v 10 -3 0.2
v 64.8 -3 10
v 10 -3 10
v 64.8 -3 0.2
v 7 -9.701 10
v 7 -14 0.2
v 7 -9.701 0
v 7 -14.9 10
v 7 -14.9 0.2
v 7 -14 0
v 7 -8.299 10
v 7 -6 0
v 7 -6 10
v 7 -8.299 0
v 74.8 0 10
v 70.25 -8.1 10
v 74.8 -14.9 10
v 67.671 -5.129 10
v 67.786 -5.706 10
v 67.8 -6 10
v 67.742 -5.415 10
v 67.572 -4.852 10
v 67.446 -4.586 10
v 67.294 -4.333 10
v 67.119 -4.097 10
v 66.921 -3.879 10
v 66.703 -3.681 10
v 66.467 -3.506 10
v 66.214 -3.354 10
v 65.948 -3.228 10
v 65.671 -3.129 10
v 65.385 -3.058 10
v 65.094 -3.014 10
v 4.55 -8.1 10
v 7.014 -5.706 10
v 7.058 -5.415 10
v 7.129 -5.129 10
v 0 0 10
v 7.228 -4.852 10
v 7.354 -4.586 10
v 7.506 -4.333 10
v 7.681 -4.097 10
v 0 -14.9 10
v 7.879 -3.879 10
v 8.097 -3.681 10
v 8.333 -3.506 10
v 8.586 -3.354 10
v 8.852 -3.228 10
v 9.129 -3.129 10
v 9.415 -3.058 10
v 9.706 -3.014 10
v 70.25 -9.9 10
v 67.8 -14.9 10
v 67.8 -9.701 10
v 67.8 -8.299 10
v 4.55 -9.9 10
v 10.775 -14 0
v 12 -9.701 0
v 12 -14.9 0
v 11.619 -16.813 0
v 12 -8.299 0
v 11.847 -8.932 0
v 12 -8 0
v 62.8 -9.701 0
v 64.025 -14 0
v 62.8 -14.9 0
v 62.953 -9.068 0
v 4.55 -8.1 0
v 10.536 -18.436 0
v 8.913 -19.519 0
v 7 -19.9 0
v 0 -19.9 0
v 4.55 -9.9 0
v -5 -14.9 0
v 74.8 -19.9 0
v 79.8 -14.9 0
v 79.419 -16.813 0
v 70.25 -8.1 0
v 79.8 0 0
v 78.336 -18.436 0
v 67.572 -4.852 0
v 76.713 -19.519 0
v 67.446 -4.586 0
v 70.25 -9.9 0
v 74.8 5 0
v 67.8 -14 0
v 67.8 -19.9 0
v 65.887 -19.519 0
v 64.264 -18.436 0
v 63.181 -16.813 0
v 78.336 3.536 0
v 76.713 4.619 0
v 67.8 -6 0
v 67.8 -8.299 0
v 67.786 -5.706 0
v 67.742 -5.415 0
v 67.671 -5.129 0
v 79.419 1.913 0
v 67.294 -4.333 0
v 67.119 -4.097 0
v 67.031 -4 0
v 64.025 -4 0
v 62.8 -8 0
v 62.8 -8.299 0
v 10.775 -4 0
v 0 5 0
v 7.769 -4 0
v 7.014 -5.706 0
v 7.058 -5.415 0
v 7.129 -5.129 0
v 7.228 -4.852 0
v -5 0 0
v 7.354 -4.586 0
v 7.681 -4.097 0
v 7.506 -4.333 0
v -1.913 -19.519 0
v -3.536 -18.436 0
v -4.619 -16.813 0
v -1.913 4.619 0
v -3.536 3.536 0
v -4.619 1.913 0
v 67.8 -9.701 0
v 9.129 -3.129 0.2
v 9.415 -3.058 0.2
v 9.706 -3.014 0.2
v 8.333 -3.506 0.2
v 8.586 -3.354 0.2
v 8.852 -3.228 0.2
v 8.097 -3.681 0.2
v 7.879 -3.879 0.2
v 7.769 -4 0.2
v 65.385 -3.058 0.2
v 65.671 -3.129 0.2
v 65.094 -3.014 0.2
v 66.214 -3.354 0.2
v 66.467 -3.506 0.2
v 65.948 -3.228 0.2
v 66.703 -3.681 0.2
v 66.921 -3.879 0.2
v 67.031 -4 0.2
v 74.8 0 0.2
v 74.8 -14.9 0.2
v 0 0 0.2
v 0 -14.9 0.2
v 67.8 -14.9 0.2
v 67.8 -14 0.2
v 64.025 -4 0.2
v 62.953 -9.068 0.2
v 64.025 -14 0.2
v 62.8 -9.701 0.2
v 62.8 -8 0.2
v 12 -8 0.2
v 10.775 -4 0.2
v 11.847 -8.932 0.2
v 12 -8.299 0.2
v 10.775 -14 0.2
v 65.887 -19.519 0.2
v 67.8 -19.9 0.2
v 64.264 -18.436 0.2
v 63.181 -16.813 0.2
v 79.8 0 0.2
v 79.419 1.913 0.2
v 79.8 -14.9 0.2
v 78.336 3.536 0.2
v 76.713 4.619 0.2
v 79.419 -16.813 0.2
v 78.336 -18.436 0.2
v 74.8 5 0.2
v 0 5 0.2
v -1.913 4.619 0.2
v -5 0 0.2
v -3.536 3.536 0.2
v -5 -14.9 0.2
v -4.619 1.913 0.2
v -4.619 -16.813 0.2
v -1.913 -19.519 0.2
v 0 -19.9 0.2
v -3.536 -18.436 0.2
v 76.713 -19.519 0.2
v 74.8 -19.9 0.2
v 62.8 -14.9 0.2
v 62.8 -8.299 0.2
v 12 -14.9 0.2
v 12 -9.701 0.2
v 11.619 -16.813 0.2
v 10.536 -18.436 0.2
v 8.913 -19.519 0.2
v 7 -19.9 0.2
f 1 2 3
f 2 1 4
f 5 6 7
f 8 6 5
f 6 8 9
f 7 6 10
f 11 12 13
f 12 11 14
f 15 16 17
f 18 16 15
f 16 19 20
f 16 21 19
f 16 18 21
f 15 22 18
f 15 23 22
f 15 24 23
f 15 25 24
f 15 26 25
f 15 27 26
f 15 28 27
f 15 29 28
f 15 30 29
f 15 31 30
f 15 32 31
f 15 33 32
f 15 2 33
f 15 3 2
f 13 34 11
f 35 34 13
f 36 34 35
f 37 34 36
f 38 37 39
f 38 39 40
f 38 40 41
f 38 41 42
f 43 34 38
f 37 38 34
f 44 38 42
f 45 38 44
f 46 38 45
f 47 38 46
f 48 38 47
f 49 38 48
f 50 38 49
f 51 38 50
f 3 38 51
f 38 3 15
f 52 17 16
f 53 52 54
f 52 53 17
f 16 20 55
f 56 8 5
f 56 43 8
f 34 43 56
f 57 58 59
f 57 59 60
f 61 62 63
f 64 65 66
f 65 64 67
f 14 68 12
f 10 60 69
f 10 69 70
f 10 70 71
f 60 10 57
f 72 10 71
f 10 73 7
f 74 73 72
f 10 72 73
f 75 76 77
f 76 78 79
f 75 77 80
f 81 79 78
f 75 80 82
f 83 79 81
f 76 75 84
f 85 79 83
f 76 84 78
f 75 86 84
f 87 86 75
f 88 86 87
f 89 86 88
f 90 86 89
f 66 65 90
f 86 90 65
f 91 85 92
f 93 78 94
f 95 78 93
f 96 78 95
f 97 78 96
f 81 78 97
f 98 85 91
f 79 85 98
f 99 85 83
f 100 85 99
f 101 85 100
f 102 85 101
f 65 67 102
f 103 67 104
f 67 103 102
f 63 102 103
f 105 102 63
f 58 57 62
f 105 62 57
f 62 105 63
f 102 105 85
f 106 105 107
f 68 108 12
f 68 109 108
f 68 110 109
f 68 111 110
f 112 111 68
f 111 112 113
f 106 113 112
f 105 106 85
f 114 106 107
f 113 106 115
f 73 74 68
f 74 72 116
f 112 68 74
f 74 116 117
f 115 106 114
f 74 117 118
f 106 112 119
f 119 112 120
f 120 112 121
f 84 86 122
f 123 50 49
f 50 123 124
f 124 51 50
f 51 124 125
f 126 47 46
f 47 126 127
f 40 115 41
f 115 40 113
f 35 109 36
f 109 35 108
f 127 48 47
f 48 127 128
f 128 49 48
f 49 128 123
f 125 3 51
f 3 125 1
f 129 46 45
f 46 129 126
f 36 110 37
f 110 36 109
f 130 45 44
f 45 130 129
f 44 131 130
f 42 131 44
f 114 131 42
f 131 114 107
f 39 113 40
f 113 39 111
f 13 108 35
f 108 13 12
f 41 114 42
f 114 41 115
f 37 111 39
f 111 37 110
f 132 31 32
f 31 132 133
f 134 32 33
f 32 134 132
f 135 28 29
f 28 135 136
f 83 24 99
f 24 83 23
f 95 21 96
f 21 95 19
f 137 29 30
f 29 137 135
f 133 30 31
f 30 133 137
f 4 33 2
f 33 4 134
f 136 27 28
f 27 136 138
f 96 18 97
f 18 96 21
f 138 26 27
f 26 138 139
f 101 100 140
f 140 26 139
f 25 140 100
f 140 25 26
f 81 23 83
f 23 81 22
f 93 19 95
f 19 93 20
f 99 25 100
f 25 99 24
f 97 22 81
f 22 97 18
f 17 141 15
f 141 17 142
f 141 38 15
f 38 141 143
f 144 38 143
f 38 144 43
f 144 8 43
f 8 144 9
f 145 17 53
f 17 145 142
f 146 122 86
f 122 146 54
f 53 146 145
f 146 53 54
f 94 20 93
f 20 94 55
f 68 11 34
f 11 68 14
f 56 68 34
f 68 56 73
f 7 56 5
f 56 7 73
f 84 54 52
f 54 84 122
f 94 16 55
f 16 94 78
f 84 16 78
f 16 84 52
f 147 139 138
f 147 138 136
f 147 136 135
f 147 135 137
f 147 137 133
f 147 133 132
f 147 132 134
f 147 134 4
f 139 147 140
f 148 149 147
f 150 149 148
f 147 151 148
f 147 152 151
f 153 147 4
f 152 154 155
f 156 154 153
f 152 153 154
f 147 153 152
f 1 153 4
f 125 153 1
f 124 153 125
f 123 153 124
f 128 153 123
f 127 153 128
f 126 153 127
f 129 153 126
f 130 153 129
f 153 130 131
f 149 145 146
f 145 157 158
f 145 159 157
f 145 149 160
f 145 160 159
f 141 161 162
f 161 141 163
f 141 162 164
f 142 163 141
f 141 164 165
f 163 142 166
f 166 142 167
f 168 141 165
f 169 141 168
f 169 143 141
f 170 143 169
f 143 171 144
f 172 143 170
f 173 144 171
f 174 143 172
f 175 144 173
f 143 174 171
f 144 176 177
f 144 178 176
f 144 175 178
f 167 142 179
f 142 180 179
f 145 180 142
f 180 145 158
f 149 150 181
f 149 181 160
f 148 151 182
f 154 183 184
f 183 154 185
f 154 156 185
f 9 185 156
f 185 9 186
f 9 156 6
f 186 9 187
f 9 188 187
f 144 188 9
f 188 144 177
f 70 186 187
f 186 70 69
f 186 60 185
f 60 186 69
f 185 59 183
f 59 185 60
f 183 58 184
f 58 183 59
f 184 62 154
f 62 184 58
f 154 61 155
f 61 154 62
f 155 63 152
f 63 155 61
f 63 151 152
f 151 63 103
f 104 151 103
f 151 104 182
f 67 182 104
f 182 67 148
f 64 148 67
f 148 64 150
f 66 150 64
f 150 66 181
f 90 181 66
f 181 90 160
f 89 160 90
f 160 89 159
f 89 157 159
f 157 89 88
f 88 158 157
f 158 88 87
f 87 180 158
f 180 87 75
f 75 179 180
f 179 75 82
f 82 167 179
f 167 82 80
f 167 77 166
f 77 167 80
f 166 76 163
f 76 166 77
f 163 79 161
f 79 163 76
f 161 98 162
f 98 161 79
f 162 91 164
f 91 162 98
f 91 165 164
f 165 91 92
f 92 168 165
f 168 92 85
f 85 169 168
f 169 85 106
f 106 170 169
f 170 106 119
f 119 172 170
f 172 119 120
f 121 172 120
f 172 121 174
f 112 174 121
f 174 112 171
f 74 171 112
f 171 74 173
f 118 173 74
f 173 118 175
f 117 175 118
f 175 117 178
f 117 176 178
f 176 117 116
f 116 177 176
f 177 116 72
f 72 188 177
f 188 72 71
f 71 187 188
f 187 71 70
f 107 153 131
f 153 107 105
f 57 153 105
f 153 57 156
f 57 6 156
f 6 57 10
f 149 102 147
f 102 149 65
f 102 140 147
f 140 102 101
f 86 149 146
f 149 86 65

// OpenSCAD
// file: ../bracket_lib.scad
// Shared U-bracket holding a PCB in a slot in each upright. All sizes in mm.
// Part files load this with: use <bracket_lib.scad>
//
// Print settings (Ultimaker Cura, PLA, 0.4 mm nozzle), tuned for strength, not looks.
// Cura profile: BracketStrong.curaprofile
//   Orientation       On its side: U-profile flat on the plate, depth upward.
//                     bracket_printable() already rotates it this way.
//                     Layers then run across the uprights, not up them. No supports needed.
//   Layer Height      0.2 mm (thicker layers bond better than fine ones)
//   Wall Line Count   5 (walls carry most of the load; 2 mm shell each side)
//   Top/Bottom        1.2 mm
//   Infill            40 %, Gyroid (strong in all directions)
//   Printing Temp     +5..10 °C over your normal PLA profile, for better layer bonding
//   Fan Speed         reduce to ~50 %, same reason
//   Adhesion          Skirt. The 5 mm brim is part of the model (bracket_printable),
//                     because Cura cannot leave the brim out at the slot mouths.

// Concave fillet along Y, filling the corner at the origin towards +X and +Z.
module fillet(r, depth) {
    difference() {
        cube([r, depth, r]);
        translate([r, -1, r]) rotate([-90, 0, 0]) cylinder(r = r, h = depth + 2, $fn = 64);
    }
}

// slot_span:  distance between slot bottoms = PCB width + clearance (critical)
// depth:      along Y; height: top of uprights; base: floor thickness
// wall:       upright thickness
// slot_z:     bottom of slot from floor underside; slot_h: slot height
// slot_depth: how far the slot cuts into the upright, from the inside
// fillet_r:   inside corner floor/upright, 0 for none; keep below slot_z - base
// slot_flare: extra slot height at the slot bottom, tapering to 0 at the mouth. Narrow slots
//             print as a wedge (the nozzle turn at the closed end overfills it); this compensates.
function bracket_length(slot_span, wall, slot_depth) = slot_span - 2 * slot_depth + 2 * wall;

module bracket(slot_span, depth, height, base, wall, slot_z, slot_h, slot_depth, fillet_r, slot_flare = 0) {
    length = bracket_length(slot_span, wall, slot_depth);
    echo(length = length);
    difference() {
        union() {
            cube([length, depth, base]);                       // floor
            cube([wall, depth, height]);                       // left upright
            translate([length - wall, 0, 0]) cube([wall, depth, height]);  // right upright
            if (fillet_r > 0) {
                translate([wall, 0, base]) fillet(fillet_r, depth);
                translate([length - wall, 0, base]) mirror([1, 0, 0]) fillet(fillet_r, depth);
            }
        }
        // slots, cut from the inside face; 0.01 overlap avoids zero-thickness skins
        for (m = [0, 1])
            translate([m * length, 0, 0]) mirror([m, 0, 0])
                translate([0, depth + 1, 0]) rotate([90, 0, 0]) linear_extrude(depth + 2)
                    polygon([[wall - slot_depth, slot_z - slot_flare / 2], [wall + 0.01, slot_z],
                             [wall + 0.01, slot_z + slot_h], [wall - slot_depth, slot_z + slot_h + slot_flare / 2]]);
    }
}

// Same bracket, rotated into print orientation (on its side), with a one-layer brim
// that keeps brim_keepout clear around each slot mouth so it cannot fill the slot.
// brim_w = 0 for no brim.
module bracket_printable(slot_span, depth, height, base, wall, slot_z, slot_h, slot_depth, fillet_r,
                         slot_flare = 0, brim_w = 5, brim_keepout = 5, brim_h = 0.2) {
    module part() rotate([90, 0, 0])
        bracket(slot_span, depth, height, base, wall, slot_z, slot_h, slot_depth, fillet_r, slot_flare);
    length = bracket_length(slot_span, wall, slot_depth);
    part();
    if (brim_w > 0)
        linear_extrude(brim_h) difference() {
            offset(r = brim_w) projection(cut = true) translate([0, 0, -0.1]) part();
            // printed orientation: original z becomes -y
            for (x = [wall - slot_depth / 2, length - wall + slot_depth / 2])
                translate([x, -(slot_z + slot_h / 2)]) square(2 * brim_keepout, center = true);
        }
}
// main file
// SVB bracket, small. Dimensions from "SVB Bracket small.stl", plus fillets.
// Print settings: see bracket_lib.scad.
use <../bracket_lib.scad>

slot_span  = 65.7;  // slot bottoms: PCB 64.0 + 1.7 play; 66.7 let the board drop out of one slot
depth      = 10;
height     = 14.9;
base       = 3;
wall       = 7;     // 5 was thin behind the slot
slot_z     = 8.3;
slot_h     = 1.4;   // PCB 1.1; 1.5 (+0.4 flare) printed a bit loose and uneven, filed smooth
slot_depth = 2.45;  // board 1.6 into each slot when centred
slot_flare = 0.4;   // slot is 1.9 at the bottom; 1.5 straight printed as a wedge, 1.25 wire stuck
fillet_r   = 3;

bracket_printable(slot_span, depth, height, base, wall, slot_z, slot_h, slot_depth, fillet_r, slot_flare);
